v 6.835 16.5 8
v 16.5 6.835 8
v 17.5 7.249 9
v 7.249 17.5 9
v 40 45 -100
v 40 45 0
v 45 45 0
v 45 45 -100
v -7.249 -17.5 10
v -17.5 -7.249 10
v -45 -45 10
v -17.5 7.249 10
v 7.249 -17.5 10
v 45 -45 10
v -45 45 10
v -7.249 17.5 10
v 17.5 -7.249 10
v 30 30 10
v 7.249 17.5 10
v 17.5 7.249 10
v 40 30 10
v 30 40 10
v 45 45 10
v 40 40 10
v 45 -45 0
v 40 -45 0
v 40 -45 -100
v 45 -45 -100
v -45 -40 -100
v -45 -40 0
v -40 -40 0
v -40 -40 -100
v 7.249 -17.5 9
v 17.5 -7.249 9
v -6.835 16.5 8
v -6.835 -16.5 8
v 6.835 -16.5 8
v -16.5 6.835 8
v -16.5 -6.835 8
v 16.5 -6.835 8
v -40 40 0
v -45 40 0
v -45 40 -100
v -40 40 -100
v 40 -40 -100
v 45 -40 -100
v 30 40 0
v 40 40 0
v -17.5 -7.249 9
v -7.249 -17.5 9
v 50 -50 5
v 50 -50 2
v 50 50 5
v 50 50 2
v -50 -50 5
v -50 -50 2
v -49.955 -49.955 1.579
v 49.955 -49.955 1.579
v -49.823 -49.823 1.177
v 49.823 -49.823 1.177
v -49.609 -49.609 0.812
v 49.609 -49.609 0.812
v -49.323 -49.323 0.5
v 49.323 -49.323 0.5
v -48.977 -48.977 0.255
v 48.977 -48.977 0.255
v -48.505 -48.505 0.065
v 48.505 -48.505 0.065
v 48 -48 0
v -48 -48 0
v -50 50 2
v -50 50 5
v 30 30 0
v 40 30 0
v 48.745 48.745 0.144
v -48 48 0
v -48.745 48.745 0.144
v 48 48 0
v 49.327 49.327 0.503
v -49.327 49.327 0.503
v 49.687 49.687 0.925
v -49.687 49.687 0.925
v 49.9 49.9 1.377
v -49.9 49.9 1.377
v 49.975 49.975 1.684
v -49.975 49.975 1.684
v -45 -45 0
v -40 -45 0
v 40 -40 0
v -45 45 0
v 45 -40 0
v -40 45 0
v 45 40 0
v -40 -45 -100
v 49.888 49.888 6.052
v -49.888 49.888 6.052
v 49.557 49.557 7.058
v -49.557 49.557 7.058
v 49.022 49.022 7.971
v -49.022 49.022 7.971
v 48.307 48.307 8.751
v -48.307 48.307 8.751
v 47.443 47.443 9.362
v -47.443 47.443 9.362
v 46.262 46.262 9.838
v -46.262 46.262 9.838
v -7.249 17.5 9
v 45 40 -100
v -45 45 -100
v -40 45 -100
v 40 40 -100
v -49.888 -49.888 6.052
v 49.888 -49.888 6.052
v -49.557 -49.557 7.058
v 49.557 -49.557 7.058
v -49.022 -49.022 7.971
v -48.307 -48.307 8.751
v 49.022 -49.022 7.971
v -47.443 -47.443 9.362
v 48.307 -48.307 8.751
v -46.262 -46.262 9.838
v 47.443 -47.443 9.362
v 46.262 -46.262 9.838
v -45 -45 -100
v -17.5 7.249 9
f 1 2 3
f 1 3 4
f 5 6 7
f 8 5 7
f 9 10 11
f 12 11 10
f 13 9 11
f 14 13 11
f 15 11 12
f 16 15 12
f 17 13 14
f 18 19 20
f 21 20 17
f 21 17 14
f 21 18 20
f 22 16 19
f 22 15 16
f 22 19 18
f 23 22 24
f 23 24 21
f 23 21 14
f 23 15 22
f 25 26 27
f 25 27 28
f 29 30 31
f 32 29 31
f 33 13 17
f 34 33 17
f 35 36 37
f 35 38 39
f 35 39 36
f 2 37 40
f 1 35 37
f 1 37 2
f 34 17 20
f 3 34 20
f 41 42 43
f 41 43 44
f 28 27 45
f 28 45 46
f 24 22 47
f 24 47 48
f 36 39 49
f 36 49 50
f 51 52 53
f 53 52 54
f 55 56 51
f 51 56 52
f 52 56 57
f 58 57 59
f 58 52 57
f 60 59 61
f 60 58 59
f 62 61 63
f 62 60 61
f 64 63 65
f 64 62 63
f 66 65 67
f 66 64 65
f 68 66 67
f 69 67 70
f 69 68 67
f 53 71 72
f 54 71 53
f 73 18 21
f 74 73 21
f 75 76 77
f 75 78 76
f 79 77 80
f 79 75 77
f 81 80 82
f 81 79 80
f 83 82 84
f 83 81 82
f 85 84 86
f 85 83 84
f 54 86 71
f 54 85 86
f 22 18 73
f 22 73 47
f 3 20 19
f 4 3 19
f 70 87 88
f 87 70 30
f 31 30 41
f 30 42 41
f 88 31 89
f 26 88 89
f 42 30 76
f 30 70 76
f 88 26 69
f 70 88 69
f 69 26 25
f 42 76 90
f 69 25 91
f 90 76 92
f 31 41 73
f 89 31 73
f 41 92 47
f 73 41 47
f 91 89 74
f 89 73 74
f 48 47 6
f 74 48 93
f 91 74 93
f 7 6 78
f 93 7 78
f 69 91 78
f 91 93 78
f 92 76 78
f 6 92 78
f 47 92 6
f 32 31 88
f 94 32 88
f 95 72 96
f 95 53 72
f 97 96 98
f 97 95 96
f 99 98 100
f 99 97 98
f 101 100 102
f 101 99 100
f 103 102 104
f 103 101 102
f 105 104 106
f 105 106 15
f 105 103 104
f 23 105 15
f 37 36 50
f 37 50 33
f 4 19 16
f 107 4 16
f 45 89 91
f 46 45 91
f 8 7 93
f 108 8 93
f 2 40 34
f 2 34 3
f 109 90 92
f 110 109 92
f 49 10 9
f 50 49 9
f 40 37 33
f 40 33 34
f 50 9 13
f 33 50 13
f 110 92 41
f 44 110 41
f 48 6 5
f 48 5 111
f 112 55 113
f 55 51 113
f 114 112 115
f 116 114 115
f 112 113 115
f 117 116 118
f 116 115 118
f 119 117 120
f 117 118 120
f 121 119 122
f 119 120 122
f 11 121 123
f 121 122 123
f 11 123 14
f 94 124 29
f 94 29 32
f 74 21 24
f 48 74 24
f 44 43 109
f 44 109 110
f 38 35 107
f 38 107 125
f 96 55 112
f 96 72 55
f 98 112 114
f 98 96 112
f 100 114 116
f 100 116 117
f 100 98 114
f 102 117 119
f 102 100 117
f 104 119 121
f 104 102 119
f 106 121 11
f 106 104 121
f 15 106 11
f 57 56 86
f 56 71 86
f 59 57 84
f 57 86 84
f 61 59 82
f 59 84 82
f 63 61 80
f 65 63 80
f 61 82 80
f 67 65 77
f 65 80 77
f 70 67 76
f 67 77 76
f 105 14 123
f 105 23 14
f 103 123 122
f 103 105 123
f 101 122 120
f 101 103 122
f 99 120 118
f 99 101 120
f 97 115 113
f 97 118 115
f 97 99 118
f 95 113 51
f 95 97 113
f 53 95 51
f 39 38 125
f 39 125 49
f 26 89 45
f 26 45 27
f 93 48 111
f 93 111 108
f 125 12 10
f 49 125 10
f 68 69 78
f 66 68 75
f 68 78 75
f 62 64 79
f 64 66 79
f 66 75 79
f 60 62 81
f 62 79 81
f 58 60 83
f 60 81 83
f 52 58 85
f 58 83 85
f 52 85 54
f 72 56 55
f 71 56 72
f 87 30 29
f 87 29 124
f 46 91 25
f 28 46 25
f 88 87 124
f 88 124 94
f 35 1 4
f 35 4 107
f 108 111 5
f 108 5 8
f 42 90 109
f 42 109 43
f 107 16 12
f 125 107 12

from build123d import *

# Parameters (mm, degrees)
F0_W      = 100
F0_H      = 100
F1_DEPTH  = 10
F2_W      = 5
F2_H      = 5
F3_DEPTH  = 100
F4_R      = 5
F5_R      = 2
F7_DEPTH  = 2
F8_SIZE   = 1
F9_W      = 10
F9_H      = 10
F10_DEPTH = 10


with BuildPart() as f1:
    # F0 (on Top) → F1 (new body)
    with BuildSketch(Plane.XY):
        Rectangle(F0_W, F0_H)
    extrude(amount=F1_DEPTH)

    # F2 (on face) → F3 (join)
    with BuildSketch(Plane(origin=(0, 0, 0), x_dir=(1, 0, 0), z_dir=(0, 0, -1))):
        with Locations((-42.5, 42.5)):
            Rectangle(F2_W, F2_H)
        with Locations((-42.5, -42.5)):
            Rectangle(F2_W, F2_H)
        with Locations((42.5, 42.5)):
            Rectangle(F2_W, F2_H)
        with Locations((42.5, -42.5)):
            Rectangle(F2_W, F2_H)
    extrude(amount=F3_DEPTH)

    # F4
    f4_edges = [f1.edges().sort_by_distance(p)[0] for p in [
        (0, 50, 10),
        (-50, 0, 10),
        (0, -50, 10),
        (50, 0, 10),
    ]]
    fillet(f4_edges, radius=F4_R)

    # F5
    f5_edges = [f1.edges().sort_by_distance(p)[0] for p in [
        (0, -50, 0),
        (50, 0, 0),
        (0, 50, 0),
        (-50, 0, 0),
    ]]
    fillet(f5_edges, radius=F5_R)

    # F6 (on face) → F7 (cut)
    with BuildSketch(Plane.XY.offset(10)):
        Polygon((-7.248737, -17.5), (7.248737, -17.5), (17.5, -7.248737), (17.5, 7.248737), (7.248737, 17.5), (-7.248737, 17.5), (-17.5, 7.248737), (-17.5, -7.248737), align=None)
    extrude(amount=-F7_DEPTH, mode=Mode.SUBTRACT)

    # F8
    f8_edges = [f1.edges().sort_by_distance(p)[0] for p in [
        (0, -17.5, 8),
        (12.374369, -12.374369, 8),
        (17.5, 0, 8),
        (12.374369, 12.374369, 8),
        (0, 17.5, 8),
        (-12.374369, 12.374369, 8),
        (-17.5, 0, 8),
        (-12.374369, -12.374369, 8),
    ]]
    chamfer(f8_edges, length=F8_SIZE)

    # F9 (on face) → F10 (cut, through all)
    with BuildSketch(Plane.XY.offset(10)):
        with Locations((35, 35)):
            Rectangle(F9_W, F9_H)
    extrude(amount=-F10_DEPTH, mode=Mode.SUBTRACT)


solid = f1.part
